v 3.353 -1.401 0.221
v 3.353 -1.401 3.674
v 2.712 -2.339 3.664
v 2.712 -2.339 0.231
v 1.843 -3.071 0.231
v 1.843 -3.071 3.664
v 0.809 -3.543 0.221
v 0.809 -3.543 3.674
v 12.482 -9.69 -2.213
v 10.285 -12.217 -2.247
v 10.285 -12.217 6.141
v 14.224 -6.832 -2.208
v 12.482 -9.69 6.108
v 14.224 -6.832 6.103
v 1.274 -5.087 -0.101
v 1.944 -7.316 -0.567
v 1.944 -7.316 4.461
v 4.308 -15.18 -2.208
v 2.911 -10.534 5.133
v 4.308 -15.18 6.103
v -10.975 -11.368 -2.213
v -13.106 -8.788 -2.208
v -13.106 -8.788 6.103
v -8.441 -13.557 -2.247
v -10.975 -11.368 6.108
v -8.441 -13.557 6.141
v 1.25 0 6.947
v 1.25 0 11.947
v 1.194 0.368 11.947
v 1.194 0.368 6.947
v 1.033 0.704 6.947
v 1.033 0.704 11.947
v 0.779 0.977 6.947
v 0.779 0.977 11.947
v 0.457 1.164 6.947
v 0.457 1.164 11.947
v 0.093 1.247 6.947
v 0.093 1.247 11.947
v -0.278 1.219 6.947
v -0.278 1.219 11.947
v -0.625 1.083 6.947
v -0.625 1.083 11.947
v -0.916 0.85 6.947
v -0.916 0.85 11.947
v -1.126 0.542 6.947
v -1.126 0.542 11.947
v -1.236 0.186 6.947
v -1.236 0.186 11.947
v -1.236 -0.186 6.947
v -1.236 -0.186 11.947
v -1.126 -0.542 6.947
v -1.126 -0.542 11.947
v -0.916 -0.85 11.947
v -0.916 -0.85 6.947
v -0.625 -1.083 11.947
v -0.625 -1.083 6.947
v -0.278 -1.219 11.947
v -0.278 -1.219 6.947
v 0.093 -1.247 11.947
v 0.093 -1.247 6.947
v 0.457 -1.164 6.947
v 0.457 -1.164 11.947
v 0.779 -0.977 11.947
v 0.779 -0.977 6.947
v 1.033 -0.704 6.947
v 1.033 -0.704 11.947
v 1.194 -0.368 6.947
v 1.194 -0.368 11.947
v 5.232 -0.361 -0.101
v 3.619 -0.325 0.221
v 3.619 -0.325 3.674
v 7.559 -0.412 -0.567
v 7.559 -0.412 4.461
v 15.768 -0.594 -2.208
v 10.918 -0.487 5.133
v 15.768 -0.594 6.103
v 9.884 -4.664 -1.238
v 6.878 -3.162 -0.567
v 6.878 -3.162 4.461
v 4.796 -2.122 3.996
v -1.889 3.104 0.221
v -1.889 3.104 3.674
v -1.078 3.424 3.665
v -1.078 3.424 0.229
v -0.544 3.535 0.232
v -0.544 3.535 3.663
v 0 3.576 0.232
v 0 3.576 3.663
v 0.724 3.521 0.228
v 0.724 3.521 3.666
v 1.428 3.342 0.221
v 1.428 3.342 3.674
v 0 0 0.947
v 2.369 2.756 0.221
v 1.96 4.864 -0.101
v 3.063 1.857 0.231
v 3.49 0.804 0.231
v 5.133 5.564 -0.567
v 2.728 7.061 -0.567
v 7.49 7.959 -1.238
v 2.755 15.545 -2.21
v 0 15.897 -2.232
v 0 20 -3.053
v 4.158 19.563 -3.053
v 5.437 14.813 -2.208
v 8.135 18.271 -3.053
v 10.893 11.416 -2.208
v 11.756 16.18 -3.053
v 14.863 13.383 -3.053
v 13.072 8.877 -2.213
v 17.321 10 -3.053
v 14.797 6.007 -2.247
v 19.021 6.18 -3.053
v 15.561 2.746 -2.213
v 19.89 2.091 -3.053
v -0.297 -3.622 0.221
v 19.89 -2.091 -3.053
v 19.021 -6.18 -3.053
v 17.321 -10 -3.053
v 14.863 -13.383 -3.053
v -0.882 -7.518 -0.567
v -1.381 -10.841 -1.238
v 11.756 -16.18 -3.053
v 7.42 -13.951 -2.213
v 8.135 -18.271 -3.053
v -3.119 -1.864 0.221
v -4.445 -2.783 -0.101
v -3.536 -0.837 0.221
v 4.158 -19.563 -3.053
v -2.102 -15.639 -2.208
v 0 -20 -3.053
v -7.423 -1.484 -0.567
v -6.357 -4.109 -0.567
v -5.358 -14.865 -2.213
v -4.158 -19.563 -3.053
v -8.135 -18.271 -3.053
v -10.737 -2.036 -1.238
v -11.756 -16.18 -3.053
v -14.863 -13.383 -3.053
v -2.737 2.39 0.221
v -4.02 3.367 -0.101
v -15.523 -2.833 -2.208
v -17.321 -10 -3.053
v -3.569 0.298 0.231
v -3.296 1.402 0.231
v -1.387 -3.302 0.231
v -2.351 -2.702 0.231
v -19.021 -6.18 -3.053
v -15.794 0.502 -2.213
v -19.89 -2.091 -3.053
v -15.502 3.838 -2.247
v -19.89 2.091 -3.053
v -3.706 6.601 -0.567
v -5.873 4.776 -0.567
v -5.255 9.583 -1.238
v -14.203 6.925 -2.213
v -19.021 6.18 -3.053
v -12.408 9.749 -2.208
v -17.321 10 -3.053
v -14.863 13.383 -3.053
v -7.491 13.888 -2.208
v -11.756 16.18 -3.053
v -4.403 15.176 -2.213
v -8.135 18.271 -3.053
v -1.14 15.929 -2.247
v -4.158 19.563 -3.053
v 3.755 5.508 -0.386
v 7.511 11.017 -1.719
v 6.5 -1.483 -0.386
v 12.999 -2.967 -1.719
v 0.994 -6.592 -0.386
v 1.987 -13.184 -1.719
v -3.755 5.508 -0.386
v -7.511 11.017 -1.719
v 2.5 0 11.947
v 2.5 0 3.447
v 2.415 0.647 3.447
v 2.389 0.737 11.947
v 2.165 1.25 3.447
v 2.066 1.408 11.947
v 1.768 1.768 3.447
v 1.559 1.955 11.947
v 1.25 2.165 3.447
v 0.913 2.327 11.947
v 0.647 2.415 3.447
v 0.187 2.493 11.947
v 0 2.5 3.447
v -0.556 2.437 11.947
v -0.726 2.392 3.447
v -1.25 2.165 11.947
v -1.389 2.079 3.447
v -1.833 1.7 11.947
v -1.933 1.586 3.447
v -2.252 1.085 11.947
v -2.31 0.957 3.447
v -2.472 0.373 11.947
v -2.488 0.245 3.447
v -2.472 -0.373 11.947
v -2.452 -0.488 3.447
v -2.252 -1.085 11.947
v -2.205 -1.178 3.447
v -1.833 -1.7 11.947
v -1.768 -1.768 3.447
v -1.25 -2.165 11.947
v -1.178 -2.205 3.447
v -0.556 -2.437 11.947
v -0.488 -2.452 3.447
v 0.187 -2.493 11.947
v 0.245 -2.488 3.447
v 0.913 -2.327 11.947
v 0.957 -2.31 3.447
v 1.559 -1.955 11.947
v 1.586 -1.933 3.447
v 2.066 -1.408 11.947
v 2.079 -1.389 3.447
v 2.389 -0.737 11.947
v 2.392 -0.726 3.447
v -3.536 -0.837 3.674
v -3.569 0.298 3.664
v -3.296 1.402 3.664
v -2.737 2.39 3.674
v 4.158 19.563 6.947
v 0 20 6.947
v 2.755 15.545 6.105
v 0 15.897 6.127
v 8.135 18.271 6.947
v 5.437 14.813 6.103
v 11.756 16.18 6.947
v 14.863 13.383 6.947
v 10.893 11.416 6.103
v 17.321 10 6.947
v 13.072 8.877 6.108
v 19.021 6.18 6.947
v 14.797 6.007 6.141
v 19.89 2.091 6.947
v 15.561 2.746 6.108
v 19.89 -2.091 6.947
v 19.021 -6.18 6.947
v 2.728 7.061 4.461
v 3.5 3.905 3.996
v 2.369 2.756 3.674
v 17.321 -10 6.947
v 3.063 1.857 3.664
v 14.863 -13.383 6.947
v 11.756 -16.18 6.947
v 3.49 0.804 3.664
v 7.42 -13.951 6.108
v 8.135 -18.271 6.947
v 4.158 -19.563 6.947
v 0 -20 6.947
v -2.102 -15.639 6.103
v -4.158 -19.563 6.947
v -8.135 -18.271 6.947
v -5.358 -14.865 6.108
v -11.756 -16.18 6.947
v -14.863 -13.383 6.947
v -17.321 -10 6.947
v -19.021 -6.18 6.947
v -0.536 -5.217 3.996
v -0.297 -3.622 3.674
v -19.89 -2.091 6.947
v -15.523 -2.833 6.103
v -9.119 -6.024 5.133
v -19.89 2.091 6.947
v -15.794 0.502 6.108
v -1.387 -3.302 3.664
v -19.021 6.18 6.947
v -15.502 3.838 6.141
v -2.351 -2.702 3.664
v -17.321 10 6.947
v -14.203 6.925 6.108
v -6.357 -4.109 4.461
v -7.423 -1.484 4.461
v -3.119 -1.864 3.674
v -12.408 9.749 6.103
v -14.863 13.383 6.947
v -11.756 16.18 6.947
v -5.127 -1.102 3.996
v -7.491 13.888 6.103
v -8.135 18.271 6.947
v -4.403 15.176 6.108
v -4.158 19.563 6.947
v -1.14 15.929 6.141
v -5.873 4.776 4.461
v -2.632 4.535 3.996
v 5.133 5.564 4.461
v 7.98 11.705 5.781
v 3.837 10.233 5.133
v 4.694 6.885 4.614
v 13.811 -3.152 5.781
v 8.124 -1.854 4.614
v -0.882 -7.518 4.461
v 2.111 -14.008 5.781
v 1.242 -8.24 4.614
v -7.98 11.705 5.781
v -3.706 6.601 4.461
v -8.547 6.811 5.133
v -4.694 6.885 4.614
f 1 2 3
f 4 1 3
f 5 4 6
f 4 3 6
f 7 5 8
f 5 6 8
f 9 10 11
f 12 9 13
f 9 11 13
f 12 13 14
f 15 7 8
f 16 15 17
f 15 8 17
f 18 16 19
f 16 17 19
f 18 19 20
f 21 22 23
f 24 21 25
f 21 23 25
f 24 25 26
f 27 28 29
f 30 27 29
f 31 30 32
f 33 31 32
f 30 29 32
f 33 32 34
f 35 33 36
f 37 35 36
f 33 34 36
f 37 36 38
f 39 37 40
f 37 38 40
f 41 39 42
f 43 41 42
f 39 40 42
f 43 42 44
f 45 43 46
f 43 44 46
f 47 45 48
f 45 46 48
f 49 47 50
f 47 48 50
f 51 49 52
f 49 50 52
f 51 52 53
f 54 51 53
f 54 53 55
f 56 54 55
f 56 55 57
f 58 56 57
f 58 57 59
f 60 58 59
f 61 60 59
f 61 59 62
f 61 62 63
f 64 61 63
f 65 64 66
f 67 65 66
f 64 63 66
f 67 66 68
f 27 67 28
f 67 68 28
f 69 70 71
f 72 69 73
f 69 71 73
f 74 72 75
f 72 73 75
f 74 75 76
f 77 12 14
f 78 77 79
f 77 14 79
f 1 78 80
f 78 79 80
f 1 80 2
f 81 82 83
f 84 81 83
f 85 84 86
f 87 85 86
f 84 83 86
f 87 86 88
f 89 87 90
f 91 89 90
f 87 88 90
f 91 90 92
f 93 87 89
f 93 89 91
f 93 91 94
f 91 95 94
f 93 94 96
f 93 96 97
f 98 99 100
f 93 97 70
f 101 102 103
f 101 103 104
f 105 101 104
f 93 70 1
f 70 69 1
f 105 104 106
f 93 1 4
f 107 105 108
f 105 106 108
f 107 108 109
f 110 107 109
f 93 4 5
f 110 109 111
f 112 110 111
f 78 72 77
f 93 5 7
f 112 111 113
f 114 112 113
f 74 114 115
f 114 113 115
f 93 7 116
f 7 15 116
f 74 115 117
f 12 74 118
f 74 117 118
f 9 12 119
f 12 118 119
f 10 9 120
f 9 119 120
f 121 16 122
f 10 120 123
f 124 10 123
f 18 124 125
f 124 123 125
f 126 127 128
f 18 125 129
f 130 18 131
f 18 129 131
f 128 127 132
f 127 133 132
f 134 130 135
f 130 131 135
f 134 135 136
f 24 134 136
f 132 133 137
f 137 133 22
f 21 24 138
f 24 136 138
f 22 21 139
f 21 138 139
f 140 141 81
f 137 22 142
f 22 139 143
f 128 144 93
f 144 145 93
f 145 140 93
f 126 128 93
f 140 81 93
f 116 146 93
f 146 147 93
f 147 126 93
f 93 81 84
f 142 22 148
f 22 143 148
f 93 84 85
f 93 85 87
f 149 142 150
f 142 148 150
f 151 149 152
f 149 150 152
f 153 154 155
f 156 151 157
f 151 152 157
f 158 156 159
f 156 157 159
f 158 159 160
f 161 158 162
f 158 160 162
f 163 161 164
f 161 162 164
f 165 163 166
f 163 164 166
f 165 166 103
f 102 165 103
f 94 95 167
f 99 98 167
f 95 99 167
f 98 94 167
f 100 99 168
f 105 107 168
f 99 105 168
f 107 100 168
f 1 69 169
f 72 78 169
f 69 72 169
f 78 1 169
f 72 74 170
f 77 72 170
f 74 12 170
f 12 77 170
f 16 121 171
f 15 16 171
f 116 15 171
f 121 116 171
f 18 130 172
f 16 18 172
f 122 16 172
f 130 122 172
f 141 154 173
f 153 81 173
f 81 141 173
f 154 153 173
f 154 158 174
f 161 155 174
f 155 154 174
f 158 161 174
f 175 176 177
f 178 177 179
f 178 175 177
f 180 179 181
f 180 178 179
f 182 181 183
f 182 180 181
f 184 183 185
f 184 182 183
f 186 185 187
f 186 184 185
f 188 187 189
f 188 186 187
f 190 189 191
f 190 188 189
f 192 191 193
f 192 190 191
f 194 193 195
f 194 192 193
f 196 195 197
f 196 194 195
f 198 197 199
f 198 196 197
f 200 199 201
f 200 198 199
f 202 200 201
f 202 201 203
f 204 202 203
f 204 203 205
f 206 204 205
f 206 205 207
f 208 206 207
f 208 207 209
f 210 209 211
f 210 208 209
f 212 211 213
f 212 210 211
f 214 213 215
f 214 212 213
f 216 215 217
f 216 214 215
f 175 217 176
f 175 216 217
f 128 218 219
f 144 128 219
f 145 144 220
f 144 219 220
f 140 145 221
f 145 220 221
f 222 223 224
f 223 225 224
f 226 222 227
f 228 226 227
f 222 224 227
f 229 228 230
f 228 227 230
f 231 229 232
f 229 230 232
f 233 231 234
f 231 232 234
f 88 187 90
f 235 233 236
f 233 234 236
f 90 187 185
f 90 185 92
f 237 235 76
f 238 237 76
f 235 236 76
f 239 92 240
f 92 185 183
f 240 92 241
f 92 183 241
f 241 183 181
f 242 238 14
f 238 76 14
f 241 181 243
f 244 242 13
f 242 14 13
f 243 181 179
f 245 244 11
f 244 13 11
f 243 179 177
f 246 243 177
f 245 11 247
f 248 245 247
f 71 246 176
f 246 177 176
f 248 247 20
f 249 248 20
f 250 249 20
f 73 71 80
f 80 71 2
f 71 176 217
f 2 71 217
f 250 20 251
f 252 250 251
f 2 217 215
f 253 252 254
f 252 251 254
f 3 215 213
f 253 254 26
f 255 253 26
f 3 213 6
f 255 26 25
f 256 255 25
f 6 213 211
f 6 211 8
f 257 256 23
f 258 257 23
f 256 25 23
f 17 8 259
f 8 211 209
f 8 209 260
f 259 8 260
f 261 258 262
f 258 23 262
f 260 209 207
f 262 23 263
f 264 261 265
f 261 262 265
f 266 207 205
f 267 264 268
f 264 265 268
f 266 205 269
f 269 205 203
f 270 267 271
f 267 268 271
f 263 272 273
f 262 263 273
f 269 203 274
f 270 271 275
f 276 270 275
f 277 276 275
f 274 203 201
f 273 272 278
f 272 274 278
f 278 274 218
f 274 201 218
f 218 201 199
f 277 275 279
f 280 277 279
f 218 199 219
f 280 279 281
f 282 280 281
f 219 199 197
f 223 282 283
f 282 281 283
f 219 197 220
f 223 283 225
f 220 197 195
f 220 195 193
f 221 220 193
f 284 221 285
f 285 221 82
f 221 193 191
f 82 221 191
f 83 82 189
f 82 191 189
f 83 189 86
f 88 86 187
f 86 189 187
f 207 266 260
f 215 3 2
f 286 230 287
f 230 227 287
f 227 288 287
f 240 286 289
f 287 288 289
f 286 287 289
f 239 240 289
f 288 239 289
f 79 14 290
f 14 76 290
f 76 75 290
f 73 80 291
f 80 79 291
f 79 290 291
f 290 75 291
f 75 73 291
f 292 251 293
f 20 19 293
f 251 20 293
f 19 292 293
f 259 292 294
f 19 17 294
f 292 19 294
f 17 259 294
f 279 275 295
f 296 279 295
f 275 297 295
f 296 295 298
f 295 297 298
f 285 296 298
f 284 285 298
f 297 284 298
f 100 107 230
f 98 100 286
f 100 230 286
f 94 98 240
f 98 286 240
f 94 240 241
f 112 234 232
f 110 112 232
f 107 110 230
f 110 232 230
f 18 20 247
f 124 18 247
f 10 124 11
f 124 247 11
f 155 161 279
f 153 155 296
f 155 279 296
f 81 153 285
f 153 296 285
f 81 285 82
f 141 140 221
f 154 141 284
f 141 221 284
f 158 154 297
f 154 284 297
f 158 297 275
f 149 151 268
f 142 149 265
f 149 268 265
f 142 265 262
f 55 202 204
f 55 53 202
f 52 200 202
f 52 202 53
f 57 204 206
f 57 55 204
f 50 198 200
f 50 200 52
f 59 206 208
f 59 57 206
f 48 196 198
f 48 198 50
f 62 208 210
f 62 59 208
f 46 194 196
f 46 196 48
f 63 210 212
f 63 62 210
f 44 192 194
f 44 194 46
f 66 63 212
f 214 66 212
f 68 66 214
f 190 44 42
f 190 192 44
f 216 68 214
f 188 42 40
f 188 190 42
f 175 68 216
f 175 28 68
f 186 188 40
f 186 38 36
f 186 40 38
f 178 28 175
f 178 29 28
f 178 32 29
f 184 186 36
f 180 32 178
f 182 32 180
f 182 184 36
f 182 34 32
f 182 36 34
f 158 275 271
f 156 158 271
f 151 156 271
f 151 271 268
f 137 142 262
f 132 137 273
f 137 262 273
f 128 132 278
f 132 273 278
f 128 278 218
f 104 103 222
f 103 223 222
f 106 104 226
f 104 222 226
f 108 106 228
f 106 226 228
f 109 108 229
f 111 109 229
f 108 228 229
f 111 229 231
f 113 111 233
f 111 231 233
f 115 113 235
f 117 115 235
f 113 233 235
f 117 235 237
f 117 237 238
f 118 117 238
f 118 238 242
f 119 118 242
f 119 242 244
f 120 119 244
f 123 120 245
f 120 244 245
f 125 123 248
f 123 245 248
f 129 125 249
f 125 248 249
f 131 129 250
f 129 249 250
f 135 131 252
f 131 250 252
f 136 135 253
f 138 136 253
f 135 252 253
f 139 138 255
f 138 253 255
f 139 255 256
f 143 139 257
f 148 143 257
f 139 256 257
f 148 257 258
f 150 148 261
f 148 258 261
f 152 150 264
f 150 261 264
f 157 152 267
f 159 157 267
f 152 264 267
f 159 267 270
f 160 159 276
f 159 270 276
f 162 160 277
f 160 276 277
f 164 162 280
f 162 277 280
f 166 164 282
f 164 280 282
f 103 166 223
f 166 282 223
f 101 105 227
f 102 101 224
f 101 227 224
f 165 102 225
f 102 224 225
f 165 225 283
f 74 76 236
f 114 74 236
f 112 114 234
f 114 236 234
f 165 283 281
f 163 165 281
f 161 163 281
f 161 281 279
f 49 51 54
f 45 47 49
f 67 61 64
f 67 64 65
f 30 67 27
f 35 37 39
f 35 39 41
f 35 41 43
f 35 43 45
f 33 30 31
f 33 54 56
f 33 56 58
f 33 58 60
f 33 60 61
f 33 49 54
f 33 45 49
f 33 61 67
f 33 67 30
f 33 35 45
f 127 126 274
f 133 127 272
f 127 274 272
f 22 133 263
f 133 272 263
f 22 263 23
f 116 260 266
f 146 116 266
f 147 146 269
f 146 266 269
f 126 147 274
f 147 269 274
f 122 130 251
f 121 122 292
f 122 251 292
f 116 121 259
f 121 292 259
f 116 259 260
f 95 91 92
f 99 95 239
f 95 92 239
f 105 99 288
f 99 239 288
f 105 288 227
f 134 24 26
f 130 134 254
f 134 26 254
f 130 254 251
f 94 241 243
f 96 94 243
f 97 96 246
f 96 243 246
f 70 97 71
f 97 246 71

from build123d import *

# Parameters (mm, degrees)
CUT_EXTRUDE1_DEPTH       = 11
SKETCH4_R                = 2.5
BOSS_EXTRUDE1_DEPTH      = 5
BOSS_EXTRUDE1_DEPTH_BACK = 5
SKETCH5_R                = 1.25
CUT_EXTRUDE2_DEPTH       = 5


with BuildPart() as part:
    # Sketch2 → Revolve2 (revolve)
    with BuildSketch(Plane(origin=(0, 0, 0), x_dir=(0, 0, -1), z_dir=(1, 0, 0))):
        Polygon((-0.947368421, 0), (3.052631579, 20), (-6.947368421, 20), (-2.947368421, 0), align=None)
    revolve(axis=Axis((0, 0, 1.947368421), (0, 0, -1)))

    # Sketch3 → Cut-Extrude1 (cut, through all)
    with BuildSketch(Plane.XY.offset(6.947368421)):
        with BuildLine():
            Line((1.427639009, 3.341779315), (5.437421768, 14.812857935))
            ThreePointArc((5.437421768, 14.812857935), (2.195765142, 15.648221894), (-1.139973889, 15.929319272))
            ThreePointArc((-1.139973889, 15.929319272), (-4.401690999, 15.176078194), (-7.49135707, 13.887616244))
            Line((-7.49135707, 13.887616244), (-1.888958706, 3.104428633))
            ThreePointArc((-1.888958706, 3.104428633), (-0.255193929, 3.565928667), (1.427639009, 3.341779315))
        make_face()
        with BuildLine():
            Line((3.619385709, -0.325098782), (15.768120796, -0.593870567))
            ThreePointArc((15.768120796, -0.593870567), (15.560872146, 2.74726975), (14.797411589, 6.00660996))
            ThreePointArc((14.797411589, 6.00660996), (13.073110736, 8.875922977), (10.892951279, 11.416213388))
            Line((10.892951279, 11.416213388), (2.368766739, 2.755827692))
            ThreePointArc((2.368766739, 2.755827692), (3.312540434, 1.344636408), (3.619385709, -0.325098782))
        make_face()
        with BuildLine():
            Line((0.809264378, -3.542701412), (4.307812822, -15.17989013))
            ThreePointArc((4.307812822, -15.17989013), (7.421382738, -13.950315812), (10.285277197, -12.217030159))
            ThreePointArc((10.285277197, -12.217030159), (12.481317772, -9.690456113), (14.223571198, -6.832008347))
            Line((14.223571198, -6.832008347), (3.352937062, -1.401233452))
            ThreePointArc((3.352937062, -1.401233452), (2.302456507, -2.734897664), (0.809264378, -3.542701412))
        make_face()
        with BuildLine():
            Line((-3.119232818, -1.864411103), (-13.105746054, -8.787817479))
            ThreePointArc((-13.105746054, -8.787817479), (-10.97420537, -11.369039076), (-8.440760697, -13.55714984))
            ThreePointArc((-8.440760697, -13.55714984), (-5.359232128, -14.864954222), (-2.102300837, -15.638626758))
            Line((-2.102300837, -15.638626758), (-0.296537672, -3.621837592))
            ThreePointArc((-0.296537672, -3.621837592), (-1.889544056, -3.03489612), (-3.119232818, -1.864411103))
        make_face()
        with BuildLine():
            Line((-2.737056278, 2.390431982), (-12.407609332, 9.748720242))
            ThreePointArc((-12.407609332, 9.748720242), (-14.203814656, 6.923863244), (-15.501954199, 3.838250768))
            ThreePointArc((-15.501954199, 3.838250768), (-15.793505381, 0.503409163), (-15.52286457, -2.833194526))
            Line((-15.52286457, -2.833194526), (-3.536207423, -0.837185281))
            ThreePointArc((-3.536207423, -0.837185281), (-3.470258956, 0.85922871), (-2.737056278, 2.390431982))
        make_face()
    extrude(amount=-CUT_EXTRUDE1_DEPTH, mode=Mode.SUBTRACT)

    # Sketch4 → Boss-Extrude1 (add, two sides)
    with BuildSketch(Plane.XY.offset(6.947368421)) as boss_extrude1_sk:
        Circle(SKETCH4_R)
    extrude(amount=BOSS_EXTRUDE1_DEPTH)
    extrude(boss_extrude1_sk.sketch, amount=-BOSS_EXTRUDE1_DEPTH_BACK)

    # Sketch5 → Cut-Extrude2 (cut)
    with BuildSketch(Plane.XY.offset(11.947368421)):
        Circle(SKETCH5_R)
    extrude(amount=-CUT_EXTRUDE2_DEPTH, mode=Mode.SUBTRACT)


solid = part.part
